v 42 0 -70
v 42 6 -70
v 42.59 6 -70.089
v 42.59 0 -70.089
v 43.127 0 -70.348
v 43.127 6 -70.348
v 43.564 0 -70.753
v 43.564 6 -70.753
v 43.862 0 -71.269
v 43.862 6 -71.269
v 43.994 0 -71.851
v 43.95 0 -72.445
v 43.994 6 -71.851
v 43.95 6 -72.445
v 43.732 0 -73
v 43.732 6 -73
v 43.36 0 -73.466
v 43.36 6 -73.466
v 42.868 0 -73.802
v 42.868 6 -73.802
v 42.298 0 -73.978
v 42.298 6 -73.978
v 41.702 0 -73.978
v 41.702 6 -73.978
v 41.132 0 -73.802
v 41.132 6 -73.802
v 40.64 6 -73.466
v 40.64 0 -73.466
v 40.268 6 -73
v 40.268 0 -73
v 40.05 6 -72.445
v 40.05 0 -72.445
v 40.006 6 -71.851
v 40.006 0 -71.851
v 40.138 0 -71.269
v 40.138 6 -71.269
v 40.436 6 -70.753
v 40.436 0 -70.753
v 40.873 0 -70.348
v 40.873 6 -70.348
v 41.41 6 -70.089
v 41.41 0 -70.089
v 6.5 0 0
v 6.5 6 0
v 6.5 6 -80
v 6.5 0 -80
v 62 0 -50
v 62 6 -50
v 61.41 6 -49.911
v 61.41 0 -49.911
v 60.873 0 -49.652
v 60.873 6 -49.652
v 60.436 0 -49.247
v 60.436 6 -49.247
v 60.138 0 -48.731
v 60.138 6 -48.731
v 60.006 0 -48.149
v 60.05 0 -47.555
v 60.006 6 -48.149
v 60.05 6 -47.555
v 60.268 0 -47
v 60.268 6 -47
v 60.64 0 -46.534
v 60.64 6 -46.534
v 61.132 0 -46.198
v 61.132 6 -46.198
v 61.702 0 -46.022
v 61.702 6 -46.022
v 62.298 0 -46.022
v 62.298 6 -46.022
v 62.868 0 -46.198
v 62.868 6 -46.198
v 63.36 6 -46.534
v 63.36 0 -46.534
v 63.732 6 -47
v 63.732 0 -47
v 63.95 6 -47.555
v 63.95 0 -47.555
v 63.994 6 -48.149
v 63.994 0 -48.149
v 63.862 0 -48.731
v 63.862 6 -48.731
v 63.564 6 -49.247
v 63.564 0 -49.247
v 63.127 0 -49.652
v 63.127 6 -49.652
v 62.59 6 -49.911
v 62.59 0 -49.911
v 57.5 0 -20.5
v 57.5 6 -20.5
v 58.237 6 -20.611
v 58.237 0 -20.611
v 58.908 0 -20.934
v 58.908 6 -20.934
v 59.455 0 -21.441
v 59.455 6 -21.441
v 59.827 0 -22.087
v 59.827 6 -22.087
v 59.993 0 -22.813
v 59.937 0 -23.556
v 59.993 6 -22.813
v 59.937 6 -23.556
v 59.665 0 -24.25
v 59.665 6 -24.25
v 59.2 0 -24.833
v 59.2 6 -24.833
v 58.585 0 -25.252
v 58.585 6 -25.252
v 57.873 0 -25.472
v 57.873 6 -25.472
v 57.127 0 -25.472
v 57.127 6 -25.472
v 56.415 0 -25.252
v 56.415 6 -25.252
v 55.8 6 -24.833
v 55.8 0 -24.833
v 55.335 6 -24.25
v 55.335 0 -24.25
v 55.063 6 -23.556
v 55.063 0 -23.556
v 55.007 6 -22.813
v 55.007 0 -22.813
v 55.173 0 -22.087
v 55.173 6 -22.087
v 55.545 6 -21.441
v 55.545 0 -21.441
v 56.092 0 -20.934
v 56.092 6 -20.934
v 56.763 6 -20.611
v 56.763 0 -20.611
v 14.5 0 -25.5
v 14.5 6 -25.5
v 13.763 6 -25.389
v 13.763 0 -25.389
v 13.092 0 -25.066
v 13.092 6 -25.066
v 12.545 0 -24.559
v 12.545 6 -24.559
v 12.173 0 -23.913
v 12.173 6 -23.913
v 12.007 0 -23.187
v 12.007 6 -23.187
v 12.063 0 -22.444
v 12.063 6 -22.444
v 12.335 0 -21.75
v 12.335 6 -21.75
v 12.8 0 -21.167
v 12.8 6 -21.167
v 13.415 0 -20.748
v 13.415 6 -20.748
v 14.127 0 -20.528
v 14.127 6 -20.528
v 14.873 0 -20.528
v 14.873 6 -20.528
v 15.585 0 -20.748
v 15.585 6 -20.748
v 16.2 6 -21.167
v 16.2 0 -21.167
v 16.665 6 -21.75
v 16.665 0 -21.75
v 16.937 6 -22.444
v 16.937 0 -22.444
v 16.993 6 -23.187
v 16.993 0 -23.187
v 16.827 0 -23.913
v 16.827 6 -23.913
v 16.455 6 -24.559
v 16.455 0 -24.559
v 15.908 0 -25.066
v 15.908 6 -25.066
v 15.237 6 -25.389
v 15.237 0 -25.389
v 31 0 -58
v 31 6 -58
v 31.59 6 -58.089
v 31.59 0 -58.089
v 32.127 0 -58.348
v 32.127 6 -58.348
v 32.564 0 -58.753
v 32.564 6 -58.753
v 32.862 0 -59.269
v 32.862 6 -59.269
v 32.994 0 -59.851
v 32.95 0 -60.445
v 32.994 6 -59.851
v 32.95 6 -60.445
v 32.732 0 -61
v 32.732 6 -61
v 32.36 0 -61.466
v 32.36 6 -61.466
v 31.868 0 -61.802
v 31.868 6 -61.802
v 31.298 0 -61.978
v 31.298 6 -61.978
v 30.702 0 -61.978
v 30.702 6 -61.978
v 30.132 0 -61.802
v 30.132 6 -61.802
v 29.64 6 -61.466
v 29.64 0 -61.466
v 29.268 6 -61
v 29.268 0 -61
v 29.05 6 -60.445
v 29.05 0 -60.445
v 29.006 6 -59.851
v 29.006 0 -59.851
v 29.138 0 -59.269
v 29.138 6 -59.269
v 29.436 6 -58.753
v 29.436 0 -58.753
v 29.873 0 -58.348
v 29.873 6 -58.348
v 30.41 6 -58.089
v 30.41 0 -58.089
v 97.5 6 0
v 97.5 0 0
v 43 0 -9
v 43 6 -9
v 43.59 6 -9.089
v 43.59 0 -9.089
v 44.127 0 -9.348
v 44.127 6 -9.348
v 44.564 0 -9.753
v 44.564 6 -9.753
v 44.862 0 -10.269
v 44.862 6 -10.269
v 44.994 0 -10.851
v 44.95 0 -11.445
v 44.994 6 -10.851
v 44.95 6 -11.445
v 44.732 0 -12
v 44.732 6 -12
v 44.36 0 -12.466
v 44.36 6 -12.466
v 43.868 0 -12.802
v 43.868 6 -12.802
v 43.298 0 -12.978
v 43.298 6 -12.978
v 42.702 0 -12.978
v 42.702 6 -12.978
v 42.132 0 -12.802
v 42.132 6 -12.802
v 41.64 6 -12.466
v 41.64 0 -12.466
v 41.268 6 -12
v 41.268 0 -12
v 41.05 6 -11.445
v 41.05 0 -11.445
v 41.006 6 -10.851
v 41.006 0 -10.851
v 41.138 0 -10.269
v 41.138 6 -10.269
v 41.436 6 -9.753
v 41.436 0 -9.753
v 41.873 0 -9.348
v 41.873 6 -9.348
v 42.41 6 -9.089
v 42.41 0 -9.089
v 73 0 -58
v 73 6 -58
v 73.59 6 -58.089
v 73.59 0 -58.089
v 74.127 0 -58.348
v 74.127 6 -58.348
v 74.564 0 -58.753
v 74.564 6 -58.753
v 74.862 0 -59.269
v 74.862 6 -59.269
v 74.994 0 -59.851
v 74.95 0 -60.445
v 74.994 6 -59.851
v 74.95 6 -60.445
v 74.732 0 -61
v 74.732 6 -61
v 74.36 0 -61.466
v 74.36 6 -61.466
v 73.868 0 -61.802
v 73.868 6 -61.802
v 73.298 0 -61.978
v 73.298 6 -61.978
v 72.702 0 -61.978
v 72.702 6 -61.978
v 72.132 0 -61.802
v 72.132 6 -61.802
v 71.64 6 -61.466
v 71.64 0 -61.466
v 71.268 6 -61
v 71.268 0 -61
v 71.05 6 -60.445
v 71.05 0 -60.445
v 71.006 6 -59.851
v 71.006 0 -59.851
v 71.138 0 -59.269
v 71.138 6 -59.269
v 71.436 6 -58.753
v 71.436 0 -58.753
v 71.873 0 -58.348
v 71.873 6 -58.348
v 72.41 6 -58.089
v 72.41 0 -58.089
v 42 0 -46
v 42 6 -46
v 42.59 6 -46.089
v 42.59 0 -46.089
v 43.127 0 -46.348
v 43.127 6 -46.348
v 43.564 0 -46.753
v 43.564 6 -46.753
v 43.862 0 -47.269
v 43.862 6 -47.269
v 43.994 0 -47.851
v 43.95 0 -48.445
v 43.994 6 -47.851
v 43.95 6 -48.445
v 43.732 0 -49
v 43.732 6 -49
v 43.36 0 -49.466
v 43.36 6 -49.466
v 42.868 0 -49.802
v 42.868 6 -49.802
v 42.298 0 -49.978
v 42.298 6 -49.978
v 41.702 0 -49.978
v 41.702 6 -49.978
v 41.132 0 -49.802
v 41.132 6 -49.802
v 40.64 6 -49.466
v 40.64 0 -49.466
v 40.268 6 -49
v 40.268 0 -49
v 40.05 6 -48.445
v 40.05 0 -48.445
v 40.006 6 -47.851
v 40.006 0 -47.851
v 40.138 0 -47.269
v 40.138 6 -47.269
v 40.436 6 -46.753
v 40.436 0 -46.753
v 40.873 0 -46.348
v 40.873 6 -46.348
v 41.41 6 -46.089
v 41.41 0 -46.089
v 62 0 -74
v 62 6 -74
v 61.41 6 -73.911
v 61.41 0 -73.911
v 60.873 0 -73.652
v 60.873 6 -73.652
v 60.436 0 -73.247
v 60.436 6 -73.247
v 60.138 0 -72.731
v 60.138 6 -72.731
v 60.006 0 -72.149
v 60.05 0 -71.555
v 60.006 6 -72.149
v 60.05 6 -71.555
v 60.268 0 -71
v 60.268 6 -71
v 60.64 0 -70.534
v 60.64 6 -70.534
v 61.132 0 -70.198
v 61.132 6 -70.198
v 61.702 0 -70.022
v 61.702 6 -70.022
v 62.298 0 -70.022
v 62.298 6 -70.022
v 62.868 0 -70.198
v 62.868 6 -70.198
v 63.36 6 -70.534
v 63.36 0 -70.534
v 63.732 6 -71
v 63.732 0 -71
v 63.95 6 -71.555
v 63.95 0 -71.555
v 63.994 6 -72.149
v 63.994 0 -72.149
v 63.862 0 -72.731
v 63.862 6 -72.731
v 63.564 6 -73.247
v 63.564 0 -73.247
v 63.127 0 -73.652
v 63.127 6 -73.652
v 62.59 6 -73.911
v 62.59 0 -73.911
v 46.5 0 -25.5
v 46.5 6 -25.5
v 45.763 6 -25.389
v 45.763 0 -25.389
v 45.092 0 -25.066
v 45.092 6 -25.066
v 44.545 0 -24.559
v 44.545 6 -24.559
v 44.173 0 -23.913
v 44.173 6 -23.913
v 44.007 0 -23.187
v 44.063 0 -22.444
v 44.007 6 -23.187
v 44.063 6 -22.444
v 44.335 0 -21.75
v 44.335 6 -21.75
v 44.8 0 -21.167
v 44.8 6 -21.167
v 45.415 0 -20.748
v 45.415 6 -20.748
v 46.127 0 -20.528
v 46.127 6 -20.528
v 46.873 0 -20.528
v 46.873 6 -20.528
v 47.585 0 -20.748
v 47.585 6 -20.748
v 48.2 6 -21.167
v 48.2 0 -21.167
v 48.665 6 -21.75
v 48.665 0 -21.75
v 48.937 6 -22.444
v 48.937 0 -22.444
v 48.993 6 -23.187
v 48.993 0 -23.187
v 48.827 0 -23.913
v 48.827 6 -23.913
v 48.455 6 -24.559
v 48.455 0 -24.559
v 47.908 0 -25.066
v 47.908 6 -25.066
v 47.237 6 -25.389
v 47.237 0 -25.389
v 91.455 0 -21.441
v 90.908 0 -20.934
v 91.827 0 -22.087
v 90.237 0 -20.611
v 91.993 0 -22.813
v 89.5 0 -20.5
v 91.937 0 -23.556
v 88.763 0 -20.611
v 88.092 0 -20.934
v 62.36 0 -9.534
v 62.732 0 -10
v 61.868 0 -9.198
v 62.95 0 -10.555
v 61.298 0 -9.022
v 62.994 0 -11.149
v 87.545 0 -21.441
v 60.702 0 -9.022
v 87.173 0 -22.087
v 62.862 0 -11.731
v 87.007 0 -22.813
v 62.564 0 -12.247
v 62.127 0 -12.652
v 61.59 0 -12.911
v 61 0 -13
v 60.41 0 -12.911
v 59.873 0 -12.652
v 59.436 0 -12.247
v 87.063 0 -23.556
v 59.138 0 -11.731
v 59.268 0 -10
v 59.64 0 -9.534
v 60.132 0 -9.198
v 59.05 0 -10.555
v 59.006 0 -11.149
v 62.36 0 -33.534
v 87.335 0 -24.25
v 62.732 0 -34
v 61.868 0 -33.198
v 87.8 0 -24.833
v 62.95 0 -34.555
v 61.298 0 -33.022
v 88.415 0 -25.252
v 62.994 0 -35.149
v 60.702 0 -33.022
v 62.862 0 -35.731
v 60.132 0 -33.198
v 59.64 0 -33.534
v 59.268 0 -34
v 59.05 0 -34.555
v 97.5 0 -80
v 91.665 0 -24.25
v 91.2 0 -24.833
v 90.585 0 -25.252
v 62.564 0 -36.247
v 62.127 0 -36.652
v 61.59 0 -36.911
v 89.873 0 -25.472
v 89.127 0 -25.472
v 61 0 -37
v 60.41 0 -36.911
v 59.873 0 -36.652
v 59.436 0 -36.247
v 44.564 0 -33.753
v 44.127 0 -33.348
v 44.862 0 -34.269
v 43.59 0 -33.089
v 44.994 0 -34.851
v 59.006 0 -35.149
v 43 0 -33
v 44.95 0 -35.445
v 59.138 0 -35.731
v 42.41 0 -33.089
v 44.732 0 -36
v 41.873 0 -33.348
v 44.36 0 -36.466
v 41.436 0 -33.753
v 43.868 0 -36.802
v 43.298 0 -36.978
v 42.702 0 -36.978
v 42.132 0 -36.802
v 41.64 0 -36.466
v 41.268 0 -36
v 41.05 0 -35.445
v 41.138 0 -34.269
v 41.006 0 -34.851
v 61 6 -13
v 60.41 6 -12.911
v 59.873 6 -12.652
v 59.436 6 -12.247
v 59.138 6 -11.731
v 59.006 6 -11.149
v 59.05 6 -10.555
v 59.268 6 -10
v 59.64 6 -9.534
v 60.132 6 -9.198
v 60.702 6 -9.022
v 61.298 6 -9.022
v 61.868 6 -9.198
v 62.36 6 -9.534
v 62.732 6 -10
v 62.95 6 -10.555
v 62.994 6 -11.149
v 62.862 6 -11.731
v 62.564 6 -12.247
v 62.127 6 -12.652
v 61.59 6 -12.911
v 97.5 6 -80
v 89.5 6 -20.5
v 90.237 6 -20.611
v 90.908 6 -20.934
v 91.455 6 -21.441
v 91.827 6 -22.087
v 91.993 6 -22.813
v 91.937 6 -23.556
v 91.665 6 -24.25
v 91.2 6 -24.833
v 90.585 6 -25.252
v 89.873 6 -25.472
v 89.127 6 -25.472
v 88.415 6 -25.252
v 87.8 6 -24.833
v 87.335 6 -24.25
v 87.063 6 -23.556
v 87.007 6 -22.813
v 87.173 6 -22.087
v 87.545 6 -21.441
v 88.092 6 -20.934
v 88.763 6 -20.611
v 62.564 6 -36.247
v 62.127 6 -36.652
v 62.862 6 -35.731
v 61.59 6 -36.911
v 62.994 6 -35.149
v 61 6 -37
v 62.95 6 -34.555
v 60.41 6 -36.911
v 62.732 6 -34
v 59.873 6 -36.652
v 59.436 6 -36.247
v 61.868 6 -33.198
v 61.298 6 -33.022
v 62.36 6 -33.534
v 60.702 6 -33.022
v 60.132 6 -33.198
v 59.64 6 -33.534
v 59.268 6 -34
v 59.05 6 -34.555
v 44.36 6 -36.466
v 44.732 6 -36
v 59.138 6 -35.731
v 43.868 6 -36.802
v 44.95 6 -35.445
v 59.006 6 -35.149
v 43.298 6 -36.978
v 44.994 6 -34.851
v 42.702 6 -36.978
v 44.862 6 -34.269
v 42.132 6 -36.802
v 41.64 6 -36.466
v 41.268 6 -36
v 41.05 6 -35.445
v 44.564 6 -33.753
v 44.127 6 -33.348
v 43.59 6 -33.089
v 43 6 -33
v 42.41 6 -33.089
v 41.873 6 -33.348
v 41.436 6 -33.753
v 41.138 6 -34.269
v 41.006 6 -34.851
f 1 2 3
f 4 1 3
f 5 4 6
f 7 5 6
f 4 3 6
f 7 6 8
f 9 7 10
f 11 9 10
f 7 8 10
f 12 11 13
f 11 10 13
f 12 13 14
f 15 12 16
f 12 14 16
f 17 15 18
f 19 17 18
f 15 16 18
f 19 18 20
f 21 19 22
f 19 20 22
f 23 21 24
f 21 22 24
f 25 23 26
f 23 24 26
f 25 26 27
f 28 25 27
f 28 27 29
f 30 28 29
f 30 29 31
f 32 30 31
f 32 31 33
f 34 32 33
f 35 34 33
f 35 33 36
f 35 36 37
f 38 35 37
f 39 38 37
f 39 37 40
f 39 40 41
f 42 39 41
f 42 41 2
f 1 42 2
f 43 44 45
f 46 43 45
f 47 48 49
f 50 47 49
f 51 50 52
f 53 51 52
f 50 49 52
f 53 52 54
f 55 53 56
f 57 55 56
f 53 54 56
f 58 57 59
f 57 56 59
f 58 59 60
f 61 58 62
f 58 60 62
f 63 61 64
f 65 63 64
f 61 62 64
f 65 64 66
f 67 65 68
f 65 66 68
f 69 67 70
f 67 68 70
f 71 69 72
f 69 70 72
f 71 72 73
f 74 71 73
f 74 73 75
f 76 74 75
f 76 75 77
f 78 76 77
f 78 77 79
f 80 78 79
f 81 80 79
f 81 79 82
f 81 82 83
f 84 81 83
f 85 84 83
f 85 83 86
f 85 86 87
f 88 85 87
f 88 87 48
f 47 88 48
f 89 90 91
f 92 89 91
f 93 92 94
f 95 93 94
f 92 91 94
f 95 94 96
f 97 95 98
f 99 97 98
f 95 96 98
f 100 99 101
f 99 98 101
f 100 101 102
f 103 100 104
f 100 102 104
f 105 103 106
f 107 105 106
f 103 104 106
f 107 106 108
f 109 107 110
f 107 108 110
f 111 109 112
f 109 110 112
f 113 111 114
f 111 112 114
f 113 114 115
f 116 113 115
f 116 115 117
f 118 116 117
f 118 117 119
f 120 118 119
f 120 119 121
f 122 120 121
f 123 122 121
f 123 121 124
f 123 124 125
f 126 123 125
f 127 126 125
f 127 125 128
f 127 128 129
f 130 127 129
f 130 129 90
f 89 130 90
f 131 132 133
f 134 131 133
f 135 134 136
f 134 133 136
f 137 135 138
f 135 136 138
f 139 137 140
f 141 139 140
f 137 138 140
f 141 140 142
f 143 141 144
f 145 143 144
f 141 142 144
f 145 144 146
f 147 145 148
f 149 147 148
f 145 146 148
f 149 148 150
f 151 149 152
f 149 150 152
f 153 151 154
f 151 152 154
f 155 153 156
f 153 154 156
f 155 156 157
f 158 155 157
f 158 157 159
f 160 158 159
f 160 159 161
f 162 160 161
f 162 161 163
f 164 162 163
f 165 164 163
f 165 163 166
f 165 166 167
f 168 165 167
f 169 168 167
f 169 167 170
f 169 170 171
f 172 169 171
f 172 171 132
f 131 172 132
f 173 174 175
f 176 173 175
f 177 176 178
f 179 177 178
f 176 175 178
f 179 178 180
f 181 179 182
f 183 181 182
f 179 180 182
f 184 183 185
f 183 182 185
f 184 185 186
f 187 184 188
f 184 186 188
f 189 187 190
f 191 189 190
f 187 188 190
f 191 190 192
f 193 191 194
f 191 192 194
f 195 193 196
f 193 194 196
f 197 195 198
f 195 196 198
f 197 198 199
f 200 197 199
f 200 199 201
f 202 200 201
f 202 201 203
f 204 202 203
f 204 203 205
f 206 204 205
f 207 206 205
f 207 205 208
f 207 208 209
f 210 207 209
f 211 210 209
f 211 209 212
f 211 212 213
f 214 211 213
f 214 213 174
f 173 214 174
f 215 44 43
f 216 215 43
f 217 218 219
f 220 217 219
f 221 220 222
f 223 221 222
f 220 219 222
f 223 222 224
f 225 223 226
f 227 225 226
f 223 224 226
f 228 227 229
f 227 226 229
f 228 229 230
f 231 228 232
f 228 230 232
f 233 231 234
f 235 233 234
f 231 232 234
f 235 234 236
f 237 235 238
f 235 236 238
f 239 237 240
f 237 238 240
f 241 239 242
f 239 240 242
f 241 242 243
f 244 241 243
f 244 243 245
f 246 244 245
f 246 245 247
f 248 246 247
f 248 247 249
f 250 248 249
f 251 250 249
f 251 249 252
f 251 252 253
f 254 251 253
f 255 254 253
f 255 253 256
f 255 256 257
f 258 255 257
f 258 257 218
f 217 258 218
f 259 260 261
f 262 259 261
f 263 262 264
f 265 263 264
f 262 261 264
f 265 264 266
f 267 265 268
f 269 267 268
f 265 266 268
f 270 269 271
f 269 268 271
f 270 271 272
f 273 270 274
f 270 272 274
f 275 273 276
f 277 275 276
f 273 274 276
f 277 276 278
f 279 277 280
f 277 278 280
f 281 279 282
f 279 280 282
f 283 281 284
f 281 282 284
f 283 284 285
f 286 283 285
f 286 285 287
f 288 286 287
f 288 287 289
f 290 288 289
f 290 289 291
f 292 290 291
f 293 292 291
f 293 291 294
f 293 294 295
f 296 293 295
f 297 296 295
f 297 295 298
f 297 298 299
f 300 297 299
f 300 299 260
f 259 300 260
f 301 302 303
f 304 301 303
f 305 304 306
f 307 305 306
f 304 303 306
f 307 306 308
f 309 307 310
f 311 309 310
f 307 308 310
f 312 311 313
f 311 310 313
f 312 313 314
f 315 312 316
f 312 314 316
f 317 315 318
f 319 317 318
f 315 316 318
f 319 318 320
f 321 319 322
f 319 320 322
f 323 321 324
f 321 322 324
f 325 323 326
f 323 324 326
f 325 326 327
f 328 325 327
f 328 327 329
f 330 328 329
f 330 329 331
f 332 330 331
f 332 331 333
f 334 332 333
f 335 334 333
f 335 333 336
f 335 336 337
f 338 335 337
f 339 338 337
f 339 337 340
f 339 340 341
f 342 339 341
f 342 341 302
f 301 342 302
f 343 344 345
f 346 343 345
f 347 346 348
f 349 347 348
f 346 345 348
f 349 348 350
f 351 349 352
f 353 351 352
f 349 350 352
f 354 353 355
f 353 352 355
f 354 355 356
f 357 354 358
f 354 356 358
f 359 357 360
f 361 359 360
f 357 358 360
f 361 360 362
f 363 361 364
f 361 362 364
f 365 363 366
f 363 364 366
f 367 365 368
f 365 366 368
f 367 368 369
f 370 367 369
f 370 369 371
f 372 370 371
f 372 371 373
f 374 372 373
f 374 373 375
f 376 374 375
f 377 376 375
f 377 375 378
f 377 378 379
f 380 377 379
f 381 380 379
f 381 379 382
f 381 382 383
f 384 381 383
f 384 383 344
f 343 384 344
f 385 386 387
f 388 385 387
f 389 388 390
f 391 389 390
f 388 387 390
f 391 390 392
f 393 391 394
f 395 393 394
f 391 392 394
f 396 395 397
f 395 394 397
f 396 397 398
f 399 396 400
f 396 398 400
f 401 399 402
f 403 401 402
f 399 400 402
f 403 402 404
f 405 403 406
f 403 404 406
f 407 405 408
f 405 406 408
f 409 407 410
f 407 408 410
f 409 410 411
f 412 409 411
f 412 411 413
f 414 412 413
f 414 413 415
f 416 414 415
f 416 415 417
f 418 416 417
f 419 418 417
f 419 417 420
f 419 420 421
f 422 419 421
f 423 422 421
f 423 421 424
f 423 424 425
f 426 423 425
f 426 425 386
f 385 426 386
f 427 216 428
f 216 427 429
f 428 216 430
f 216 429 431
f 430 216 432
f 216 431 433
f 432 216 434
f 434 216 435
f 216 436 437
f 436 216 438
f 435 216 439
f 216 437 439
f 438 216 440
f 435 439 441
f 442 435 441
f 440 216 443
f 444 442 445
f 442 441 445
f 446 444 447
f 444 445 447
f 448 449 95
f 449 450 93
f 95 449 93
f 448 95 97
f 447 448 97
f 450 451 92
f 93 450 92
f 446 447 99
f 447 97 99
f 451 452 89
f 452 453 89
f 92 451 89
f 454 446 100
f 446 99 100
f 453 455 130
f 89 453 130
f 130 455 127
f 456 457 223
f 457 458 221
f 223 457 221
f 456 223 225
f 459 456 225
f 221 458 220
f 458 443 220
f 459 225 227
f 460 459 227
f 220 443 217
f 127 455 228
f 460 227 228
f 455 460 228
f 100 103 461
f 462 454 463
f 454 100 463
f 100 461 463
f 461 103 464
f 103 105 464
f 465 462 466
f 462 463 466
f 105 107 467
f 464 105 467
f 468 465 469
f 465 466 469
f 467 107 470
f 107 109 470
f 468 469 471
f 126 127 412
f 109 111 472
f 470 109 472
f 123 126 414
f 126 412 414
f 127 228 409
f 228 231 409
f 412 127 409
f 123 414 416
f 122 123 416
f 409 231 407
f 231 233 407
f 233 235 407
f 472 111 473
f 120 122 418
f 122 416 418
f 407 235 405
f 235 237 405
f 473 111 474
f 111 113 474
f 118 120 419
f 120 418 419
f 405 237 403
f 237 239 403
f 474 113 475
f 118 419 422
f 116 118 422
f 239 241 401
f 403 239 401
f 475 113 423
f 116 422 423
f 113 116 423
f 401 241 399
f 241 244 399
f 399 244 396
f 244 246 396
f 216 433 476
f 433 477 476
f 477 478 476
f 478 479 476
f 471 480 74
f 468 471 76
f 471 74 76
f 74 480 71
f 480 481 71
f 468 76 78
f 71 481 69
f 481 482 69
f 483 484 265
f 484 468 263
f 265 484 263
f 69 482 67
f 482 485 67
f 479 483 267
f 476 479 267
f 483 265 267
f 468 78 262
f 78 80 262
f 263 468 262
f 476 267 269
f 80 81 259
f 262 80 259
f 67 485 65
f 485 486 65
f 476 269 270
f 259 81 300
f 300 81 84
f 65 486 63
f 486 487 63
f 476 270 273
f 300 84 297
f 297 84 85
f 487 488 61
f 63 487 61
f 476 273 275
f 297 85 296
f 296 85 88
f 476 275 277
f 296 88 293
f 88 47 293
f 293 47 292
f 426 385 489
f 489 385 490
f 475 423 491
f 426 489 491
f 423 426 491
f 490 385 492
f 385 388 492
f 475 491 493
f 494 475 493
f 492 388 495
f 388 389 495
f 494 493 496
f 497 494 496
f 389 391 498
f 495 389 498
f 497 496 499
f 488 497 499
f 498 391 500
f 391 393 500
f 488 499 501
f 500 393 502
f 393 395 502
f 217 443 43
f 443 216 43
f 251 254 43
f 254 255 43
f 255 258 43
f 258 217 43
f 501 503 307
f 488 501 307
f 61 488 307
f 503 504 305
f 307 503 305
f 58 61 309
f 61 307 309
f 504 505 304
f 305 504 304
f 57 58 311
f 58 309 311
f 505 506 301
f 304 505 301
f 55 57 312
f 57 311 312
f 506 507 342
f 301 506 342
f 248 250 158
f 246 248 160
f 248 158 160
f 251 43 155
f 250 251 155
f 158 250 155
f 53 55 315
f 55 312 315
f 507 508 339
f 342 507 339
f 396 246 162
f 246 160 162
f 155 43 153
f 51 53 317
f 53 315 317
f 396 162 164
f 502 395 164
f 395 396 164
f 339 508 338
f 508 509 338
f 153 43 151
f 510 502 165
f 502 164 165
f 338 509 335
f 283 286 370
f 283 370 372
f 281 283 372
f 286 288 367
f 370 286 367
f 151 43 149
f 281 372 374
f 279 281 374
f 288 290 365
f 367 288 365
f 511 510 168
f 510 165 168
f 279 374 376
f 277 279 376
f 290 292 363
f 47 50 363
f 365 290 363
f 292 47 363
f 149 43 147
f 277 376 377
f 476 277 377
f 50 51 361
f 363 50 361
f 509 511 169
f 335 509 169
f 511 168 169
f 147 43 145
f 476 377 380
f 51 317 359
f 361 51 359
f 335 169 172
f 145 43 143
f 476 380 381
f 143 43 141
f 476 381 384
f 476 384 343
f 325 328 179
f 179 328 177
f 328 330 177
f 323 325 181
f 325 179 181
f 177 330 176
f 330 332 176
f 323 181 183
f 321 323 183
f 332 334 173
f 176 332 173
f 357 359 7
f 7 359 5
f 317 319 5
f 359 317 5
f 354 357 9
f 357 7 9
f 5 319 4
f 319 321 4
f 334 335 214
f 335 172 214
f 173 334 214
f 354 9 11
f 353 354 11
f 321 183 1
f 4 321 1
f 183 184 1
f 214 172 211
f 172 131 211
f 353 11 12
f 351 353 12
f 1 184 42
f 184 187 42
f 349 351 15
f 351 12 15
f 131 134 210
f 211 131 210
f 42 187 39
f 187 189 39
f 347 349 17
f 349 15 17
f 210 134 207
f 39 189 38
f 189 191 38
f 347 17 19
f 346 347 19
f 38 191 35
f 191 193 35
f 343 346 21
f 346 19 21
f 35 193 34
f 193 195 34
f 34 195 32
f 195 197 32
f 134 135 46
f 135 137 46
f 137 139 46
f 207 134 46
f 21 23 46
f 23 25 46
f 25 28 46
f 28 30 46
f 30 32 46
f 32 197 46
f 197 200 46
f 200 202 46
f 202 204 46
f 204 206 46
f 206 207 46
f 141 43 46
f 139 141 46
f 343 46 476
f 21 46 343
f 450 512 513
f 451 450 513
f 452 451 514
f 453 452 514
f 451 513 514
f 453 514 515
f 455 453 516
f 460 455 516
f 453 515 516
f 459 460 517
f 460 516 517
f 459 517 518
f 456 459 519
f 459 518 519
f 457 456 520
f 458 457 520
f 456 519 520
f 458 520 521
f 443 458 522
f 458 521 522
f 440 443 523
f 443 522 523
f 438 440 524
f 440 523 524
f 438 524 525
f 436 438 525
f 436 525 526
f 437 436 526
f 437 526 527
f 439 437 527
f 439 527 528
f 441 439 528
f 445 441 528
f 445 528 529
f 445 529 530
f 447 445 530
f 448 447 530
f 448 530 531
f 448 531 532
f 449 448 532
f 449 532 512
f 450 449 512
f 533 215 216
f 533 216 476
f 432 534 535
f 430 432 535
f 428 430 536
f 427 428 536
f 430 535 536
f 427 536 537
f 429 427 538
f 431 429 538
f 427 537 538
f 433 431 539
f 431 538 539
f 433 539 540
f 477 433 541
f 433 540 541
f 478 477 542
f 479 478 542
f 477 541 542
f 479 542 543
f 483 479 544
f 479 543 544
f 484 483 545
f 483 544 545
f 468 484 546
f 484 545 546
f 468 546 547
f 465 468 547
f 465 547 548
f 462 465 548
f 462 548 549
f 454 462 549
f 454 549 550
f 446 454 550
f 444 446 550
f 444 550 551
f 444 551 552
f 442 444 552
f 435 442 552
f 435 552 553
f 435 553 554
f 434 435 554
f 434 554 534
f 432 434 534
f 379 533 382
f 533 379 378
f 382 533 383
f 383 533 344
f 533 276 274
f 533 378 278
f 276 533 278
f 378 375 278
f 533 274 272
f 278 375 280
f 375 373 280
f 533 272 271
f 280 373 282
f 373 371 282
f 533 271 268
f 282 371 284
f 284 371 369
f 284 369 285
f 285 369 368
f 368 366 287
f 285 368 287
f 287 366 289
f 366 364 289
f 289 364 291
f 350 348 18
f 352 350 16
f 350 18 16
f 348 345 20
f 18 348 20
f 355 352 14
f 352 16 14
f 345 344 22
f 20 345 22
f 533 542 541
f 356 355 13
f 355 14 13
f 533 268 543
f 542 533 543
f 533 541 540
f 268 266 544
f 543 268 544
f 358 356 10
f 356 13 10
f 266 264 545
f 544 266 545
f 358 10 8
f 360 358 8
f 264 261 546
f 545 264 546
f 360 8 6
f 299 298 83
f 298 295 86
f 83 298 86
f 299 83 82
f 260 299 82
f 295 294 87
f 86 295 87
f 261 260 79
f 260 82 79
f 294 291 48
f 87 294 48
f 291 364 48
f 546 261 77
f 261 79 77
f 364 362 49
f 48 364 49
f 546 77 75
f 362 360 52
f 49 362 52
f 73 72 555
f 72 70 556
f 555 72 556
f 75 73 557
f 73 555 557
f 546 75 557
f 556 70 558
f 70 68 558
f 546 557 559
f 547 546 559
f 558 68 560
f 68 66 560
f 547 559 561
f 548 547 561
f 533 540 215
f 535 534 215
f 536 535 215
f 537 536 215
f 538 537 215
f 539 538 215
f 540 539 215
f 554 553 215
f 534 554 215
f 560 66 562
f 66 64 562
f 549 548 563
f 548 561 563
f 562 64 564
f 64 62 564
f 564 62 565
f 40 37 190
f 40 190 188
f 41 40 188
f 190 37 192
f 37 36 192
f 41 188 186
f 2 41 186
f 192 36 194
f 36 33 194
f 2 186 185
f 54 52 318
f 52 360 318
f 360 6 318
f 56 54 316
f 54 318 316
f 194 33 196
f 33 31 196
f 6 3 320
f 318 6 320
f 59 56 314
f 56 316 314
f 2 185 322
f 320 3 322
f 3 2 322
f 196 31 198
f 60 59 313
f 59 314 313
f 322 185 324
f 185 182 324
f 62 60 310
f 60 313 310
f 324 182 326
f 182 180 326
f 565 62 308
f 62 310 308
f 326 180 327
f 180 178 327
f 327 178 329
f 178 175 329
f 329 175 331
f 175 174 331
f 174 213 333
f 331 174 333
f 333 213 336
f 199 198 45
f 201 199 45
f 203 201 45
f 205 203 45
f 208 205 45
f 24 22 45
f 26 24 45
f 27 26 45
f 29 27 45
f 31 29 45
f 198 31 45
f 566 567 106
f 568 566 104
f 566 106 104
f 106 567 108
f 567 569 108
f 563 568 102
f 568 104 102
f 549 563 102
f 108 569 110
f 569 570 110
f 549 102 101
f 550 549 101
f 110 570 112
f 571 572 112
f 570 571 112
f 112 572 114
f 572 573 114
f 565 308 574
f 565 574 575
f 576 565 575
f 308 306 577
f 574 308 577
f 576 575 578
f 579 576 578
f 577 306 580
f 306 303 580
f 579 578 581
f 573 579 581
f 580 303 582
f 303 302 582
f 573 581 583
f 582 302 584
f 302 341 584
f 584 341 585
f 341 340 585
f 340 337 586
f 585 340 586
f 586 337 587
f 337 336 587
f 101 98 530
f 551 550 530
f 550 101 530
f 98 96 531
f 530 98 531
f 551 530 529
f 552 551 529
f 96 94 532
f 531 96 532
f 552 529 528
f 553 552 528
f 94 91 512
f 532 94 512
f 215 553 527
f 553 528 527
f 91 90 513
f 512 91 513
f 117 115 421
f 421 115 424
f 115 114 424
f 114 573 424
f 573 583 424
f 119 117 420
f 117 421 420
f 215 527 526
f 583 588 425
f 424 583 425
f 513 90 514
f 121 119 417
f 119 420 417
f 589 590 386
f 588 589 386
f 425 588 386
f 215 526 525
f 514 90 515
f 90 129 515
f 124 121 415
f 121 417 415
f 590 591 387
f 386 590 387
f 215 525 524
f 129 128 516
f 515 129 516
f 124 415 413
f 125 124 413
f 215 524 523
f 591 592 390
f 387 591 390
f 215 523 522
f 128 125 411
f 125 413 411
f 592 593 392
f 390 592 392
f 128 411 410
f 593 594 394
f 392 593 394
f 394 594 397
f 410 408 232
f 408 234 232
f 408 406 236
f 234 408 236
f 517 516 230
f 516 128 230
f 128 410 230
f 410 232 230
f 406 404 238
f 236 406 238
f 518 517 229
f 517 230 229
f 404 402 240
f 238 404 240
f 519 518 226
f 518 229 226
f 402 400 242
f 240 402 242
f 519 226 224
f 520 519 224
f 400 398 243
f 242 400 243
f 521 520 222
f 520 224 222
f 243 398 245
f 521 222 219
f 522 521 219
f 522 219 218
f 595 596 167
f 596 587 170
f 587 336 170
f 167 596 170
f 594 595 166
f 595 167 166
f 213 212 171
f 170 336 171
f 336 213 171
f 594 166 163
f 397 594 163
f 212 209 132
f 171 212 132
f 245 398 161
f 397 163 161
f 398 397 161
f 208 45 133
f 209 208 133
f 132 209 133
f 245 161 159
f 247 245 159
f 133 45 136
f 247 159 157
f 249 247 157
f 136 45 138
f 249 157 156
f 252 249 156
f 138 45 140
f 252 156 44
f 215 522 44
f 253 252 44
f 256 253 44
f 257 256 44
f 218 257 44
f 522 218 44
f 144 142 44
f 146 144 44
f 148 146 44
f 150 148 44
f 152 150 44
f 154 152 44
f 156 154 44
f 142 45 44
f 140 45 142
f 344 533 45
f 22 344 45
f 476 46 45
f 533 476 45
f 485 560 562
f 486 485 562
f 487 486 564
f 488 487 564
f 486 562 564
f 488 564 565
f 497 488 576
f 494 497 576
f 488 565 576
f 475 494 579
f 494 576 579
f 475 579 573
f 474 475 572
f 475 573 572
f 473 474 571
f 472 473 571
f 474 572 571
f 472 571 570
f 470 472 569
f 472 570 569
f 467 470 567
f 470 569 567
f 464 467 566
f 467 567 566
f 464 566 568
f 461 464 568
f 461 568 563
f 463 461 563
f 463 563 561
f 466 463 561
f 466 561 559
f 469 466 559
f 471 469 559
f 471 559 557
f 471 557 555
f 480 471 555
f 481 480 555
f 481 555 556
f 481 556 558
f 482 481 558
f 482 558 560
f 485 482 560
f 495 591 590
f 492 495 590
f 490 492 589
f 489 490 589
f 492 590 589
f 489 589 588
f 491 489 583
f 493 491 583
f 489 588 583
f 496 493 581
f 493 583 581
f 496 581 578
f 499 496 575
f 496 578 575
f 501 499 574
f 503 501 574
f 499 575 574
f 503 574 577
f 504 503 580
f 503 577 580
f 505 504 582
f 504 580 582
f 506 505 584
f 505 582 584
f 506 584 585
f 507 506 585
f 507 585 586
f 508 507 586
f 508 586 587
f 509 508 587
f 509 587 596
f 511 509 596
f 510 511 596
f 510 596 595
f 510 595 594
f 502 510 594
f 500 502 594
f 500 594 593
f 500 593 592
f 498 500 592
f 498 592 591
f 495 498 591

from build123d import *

# Parameters (mm, degrees)
EXTRUDE_1_DEPTH     = 104
SKETCH_2_R          = 2
SKETCH_2_R_2        = 2.5
SKETCH_2_W          = 6.5
SKETCH_2_H          = 80
CUT_EXTRUDE_1_DEPTH = 132.346869015


with BuildPart() as part:
    # 草图1 → 凸台-拉伸1 (new body)
    with BuildSketch(Plane(origin=(0, 0, 0), x_dir=(0, 0, -1), z_dir=(1, 0, 0))):
        Polygon((0, 0), (80, 0), (80, 6), (6, 6), (0, 6), align=None)
    extrude(amount=EXTRUDE_1_DEPTH)

    # 草图2 → 切除-拉伸1 (cut, through all)
    with BuildSketch(Plane(origin=(0, 6, 0), x_dir=(1, 0, 0), z_dir=(0, 1, 0))):
        with Locations(Location((43, 11, 0), (0, 0, 270))):
            Circle(SKETCH_2_R)
        with Locations(Location((43, 35, 0), (0, 0, 270))):
            Circle(SKETCH_2_R)
        with Locations(Location((42, 48, 0), (0, 0, 270))):
            Circle(SKETCH_2_R)
        with Locations(Location((42, 72, 0), (0, 0, 270))):
            Circle(SKETCH_2_R)
        with Locations(Location((62, 72, 0), (0, 0, 90))):
            Circle(SKETCH_2_R)
        with Locations(Location((62, 48, 0), (0, 0, 90))):
            Circle(SKETCH_2_R)
        with Locations(Location((61, 35, 0), (0, 0, 90))):
            Circle(SKETCH_2_R)
        with Locations(Location((61, 11, 0), (0, 0, 90))):
            Circle(SKETCH_2_R)
        with Locations(Location((57.5, 23, 0), (0, 0, 270))):
            Circle(SKETCH_2_R_2)
        with Locations(Location((89.5, 23, 0), (0, 0, 270))):
            Circle(SKETCH_2_R_2)
        with Locations(Location((46.5, 23, 0), (0, 0, 90))):
            Circle(SKETCH_2_R_2)
        with Locations(Location((14.5, 23, 0), (0, 0, 90))):
            Circle(SKETCH_2_R_2)
        with Locations(Location((73, 60, 0), (0, 0, 270))):
            Circle(SKETCH_2_R)
        with Locations(Location((31, 60, 0), (0, 0, 270))):
            Circle(SKETCH_2_R)
        with Locations((100.75, 40)):
            Rectangle(SKETCH_2_W, SKETCH_2_H)
        with Locations((3.25, 40)):
            Rectangle(SKETCH_2_W, SKETCH_2_H)
    extrude(amount=-CUT_EXTRUDE_1_DEPTH, mode=Mode.SUBTRACT)


solid = part.part
